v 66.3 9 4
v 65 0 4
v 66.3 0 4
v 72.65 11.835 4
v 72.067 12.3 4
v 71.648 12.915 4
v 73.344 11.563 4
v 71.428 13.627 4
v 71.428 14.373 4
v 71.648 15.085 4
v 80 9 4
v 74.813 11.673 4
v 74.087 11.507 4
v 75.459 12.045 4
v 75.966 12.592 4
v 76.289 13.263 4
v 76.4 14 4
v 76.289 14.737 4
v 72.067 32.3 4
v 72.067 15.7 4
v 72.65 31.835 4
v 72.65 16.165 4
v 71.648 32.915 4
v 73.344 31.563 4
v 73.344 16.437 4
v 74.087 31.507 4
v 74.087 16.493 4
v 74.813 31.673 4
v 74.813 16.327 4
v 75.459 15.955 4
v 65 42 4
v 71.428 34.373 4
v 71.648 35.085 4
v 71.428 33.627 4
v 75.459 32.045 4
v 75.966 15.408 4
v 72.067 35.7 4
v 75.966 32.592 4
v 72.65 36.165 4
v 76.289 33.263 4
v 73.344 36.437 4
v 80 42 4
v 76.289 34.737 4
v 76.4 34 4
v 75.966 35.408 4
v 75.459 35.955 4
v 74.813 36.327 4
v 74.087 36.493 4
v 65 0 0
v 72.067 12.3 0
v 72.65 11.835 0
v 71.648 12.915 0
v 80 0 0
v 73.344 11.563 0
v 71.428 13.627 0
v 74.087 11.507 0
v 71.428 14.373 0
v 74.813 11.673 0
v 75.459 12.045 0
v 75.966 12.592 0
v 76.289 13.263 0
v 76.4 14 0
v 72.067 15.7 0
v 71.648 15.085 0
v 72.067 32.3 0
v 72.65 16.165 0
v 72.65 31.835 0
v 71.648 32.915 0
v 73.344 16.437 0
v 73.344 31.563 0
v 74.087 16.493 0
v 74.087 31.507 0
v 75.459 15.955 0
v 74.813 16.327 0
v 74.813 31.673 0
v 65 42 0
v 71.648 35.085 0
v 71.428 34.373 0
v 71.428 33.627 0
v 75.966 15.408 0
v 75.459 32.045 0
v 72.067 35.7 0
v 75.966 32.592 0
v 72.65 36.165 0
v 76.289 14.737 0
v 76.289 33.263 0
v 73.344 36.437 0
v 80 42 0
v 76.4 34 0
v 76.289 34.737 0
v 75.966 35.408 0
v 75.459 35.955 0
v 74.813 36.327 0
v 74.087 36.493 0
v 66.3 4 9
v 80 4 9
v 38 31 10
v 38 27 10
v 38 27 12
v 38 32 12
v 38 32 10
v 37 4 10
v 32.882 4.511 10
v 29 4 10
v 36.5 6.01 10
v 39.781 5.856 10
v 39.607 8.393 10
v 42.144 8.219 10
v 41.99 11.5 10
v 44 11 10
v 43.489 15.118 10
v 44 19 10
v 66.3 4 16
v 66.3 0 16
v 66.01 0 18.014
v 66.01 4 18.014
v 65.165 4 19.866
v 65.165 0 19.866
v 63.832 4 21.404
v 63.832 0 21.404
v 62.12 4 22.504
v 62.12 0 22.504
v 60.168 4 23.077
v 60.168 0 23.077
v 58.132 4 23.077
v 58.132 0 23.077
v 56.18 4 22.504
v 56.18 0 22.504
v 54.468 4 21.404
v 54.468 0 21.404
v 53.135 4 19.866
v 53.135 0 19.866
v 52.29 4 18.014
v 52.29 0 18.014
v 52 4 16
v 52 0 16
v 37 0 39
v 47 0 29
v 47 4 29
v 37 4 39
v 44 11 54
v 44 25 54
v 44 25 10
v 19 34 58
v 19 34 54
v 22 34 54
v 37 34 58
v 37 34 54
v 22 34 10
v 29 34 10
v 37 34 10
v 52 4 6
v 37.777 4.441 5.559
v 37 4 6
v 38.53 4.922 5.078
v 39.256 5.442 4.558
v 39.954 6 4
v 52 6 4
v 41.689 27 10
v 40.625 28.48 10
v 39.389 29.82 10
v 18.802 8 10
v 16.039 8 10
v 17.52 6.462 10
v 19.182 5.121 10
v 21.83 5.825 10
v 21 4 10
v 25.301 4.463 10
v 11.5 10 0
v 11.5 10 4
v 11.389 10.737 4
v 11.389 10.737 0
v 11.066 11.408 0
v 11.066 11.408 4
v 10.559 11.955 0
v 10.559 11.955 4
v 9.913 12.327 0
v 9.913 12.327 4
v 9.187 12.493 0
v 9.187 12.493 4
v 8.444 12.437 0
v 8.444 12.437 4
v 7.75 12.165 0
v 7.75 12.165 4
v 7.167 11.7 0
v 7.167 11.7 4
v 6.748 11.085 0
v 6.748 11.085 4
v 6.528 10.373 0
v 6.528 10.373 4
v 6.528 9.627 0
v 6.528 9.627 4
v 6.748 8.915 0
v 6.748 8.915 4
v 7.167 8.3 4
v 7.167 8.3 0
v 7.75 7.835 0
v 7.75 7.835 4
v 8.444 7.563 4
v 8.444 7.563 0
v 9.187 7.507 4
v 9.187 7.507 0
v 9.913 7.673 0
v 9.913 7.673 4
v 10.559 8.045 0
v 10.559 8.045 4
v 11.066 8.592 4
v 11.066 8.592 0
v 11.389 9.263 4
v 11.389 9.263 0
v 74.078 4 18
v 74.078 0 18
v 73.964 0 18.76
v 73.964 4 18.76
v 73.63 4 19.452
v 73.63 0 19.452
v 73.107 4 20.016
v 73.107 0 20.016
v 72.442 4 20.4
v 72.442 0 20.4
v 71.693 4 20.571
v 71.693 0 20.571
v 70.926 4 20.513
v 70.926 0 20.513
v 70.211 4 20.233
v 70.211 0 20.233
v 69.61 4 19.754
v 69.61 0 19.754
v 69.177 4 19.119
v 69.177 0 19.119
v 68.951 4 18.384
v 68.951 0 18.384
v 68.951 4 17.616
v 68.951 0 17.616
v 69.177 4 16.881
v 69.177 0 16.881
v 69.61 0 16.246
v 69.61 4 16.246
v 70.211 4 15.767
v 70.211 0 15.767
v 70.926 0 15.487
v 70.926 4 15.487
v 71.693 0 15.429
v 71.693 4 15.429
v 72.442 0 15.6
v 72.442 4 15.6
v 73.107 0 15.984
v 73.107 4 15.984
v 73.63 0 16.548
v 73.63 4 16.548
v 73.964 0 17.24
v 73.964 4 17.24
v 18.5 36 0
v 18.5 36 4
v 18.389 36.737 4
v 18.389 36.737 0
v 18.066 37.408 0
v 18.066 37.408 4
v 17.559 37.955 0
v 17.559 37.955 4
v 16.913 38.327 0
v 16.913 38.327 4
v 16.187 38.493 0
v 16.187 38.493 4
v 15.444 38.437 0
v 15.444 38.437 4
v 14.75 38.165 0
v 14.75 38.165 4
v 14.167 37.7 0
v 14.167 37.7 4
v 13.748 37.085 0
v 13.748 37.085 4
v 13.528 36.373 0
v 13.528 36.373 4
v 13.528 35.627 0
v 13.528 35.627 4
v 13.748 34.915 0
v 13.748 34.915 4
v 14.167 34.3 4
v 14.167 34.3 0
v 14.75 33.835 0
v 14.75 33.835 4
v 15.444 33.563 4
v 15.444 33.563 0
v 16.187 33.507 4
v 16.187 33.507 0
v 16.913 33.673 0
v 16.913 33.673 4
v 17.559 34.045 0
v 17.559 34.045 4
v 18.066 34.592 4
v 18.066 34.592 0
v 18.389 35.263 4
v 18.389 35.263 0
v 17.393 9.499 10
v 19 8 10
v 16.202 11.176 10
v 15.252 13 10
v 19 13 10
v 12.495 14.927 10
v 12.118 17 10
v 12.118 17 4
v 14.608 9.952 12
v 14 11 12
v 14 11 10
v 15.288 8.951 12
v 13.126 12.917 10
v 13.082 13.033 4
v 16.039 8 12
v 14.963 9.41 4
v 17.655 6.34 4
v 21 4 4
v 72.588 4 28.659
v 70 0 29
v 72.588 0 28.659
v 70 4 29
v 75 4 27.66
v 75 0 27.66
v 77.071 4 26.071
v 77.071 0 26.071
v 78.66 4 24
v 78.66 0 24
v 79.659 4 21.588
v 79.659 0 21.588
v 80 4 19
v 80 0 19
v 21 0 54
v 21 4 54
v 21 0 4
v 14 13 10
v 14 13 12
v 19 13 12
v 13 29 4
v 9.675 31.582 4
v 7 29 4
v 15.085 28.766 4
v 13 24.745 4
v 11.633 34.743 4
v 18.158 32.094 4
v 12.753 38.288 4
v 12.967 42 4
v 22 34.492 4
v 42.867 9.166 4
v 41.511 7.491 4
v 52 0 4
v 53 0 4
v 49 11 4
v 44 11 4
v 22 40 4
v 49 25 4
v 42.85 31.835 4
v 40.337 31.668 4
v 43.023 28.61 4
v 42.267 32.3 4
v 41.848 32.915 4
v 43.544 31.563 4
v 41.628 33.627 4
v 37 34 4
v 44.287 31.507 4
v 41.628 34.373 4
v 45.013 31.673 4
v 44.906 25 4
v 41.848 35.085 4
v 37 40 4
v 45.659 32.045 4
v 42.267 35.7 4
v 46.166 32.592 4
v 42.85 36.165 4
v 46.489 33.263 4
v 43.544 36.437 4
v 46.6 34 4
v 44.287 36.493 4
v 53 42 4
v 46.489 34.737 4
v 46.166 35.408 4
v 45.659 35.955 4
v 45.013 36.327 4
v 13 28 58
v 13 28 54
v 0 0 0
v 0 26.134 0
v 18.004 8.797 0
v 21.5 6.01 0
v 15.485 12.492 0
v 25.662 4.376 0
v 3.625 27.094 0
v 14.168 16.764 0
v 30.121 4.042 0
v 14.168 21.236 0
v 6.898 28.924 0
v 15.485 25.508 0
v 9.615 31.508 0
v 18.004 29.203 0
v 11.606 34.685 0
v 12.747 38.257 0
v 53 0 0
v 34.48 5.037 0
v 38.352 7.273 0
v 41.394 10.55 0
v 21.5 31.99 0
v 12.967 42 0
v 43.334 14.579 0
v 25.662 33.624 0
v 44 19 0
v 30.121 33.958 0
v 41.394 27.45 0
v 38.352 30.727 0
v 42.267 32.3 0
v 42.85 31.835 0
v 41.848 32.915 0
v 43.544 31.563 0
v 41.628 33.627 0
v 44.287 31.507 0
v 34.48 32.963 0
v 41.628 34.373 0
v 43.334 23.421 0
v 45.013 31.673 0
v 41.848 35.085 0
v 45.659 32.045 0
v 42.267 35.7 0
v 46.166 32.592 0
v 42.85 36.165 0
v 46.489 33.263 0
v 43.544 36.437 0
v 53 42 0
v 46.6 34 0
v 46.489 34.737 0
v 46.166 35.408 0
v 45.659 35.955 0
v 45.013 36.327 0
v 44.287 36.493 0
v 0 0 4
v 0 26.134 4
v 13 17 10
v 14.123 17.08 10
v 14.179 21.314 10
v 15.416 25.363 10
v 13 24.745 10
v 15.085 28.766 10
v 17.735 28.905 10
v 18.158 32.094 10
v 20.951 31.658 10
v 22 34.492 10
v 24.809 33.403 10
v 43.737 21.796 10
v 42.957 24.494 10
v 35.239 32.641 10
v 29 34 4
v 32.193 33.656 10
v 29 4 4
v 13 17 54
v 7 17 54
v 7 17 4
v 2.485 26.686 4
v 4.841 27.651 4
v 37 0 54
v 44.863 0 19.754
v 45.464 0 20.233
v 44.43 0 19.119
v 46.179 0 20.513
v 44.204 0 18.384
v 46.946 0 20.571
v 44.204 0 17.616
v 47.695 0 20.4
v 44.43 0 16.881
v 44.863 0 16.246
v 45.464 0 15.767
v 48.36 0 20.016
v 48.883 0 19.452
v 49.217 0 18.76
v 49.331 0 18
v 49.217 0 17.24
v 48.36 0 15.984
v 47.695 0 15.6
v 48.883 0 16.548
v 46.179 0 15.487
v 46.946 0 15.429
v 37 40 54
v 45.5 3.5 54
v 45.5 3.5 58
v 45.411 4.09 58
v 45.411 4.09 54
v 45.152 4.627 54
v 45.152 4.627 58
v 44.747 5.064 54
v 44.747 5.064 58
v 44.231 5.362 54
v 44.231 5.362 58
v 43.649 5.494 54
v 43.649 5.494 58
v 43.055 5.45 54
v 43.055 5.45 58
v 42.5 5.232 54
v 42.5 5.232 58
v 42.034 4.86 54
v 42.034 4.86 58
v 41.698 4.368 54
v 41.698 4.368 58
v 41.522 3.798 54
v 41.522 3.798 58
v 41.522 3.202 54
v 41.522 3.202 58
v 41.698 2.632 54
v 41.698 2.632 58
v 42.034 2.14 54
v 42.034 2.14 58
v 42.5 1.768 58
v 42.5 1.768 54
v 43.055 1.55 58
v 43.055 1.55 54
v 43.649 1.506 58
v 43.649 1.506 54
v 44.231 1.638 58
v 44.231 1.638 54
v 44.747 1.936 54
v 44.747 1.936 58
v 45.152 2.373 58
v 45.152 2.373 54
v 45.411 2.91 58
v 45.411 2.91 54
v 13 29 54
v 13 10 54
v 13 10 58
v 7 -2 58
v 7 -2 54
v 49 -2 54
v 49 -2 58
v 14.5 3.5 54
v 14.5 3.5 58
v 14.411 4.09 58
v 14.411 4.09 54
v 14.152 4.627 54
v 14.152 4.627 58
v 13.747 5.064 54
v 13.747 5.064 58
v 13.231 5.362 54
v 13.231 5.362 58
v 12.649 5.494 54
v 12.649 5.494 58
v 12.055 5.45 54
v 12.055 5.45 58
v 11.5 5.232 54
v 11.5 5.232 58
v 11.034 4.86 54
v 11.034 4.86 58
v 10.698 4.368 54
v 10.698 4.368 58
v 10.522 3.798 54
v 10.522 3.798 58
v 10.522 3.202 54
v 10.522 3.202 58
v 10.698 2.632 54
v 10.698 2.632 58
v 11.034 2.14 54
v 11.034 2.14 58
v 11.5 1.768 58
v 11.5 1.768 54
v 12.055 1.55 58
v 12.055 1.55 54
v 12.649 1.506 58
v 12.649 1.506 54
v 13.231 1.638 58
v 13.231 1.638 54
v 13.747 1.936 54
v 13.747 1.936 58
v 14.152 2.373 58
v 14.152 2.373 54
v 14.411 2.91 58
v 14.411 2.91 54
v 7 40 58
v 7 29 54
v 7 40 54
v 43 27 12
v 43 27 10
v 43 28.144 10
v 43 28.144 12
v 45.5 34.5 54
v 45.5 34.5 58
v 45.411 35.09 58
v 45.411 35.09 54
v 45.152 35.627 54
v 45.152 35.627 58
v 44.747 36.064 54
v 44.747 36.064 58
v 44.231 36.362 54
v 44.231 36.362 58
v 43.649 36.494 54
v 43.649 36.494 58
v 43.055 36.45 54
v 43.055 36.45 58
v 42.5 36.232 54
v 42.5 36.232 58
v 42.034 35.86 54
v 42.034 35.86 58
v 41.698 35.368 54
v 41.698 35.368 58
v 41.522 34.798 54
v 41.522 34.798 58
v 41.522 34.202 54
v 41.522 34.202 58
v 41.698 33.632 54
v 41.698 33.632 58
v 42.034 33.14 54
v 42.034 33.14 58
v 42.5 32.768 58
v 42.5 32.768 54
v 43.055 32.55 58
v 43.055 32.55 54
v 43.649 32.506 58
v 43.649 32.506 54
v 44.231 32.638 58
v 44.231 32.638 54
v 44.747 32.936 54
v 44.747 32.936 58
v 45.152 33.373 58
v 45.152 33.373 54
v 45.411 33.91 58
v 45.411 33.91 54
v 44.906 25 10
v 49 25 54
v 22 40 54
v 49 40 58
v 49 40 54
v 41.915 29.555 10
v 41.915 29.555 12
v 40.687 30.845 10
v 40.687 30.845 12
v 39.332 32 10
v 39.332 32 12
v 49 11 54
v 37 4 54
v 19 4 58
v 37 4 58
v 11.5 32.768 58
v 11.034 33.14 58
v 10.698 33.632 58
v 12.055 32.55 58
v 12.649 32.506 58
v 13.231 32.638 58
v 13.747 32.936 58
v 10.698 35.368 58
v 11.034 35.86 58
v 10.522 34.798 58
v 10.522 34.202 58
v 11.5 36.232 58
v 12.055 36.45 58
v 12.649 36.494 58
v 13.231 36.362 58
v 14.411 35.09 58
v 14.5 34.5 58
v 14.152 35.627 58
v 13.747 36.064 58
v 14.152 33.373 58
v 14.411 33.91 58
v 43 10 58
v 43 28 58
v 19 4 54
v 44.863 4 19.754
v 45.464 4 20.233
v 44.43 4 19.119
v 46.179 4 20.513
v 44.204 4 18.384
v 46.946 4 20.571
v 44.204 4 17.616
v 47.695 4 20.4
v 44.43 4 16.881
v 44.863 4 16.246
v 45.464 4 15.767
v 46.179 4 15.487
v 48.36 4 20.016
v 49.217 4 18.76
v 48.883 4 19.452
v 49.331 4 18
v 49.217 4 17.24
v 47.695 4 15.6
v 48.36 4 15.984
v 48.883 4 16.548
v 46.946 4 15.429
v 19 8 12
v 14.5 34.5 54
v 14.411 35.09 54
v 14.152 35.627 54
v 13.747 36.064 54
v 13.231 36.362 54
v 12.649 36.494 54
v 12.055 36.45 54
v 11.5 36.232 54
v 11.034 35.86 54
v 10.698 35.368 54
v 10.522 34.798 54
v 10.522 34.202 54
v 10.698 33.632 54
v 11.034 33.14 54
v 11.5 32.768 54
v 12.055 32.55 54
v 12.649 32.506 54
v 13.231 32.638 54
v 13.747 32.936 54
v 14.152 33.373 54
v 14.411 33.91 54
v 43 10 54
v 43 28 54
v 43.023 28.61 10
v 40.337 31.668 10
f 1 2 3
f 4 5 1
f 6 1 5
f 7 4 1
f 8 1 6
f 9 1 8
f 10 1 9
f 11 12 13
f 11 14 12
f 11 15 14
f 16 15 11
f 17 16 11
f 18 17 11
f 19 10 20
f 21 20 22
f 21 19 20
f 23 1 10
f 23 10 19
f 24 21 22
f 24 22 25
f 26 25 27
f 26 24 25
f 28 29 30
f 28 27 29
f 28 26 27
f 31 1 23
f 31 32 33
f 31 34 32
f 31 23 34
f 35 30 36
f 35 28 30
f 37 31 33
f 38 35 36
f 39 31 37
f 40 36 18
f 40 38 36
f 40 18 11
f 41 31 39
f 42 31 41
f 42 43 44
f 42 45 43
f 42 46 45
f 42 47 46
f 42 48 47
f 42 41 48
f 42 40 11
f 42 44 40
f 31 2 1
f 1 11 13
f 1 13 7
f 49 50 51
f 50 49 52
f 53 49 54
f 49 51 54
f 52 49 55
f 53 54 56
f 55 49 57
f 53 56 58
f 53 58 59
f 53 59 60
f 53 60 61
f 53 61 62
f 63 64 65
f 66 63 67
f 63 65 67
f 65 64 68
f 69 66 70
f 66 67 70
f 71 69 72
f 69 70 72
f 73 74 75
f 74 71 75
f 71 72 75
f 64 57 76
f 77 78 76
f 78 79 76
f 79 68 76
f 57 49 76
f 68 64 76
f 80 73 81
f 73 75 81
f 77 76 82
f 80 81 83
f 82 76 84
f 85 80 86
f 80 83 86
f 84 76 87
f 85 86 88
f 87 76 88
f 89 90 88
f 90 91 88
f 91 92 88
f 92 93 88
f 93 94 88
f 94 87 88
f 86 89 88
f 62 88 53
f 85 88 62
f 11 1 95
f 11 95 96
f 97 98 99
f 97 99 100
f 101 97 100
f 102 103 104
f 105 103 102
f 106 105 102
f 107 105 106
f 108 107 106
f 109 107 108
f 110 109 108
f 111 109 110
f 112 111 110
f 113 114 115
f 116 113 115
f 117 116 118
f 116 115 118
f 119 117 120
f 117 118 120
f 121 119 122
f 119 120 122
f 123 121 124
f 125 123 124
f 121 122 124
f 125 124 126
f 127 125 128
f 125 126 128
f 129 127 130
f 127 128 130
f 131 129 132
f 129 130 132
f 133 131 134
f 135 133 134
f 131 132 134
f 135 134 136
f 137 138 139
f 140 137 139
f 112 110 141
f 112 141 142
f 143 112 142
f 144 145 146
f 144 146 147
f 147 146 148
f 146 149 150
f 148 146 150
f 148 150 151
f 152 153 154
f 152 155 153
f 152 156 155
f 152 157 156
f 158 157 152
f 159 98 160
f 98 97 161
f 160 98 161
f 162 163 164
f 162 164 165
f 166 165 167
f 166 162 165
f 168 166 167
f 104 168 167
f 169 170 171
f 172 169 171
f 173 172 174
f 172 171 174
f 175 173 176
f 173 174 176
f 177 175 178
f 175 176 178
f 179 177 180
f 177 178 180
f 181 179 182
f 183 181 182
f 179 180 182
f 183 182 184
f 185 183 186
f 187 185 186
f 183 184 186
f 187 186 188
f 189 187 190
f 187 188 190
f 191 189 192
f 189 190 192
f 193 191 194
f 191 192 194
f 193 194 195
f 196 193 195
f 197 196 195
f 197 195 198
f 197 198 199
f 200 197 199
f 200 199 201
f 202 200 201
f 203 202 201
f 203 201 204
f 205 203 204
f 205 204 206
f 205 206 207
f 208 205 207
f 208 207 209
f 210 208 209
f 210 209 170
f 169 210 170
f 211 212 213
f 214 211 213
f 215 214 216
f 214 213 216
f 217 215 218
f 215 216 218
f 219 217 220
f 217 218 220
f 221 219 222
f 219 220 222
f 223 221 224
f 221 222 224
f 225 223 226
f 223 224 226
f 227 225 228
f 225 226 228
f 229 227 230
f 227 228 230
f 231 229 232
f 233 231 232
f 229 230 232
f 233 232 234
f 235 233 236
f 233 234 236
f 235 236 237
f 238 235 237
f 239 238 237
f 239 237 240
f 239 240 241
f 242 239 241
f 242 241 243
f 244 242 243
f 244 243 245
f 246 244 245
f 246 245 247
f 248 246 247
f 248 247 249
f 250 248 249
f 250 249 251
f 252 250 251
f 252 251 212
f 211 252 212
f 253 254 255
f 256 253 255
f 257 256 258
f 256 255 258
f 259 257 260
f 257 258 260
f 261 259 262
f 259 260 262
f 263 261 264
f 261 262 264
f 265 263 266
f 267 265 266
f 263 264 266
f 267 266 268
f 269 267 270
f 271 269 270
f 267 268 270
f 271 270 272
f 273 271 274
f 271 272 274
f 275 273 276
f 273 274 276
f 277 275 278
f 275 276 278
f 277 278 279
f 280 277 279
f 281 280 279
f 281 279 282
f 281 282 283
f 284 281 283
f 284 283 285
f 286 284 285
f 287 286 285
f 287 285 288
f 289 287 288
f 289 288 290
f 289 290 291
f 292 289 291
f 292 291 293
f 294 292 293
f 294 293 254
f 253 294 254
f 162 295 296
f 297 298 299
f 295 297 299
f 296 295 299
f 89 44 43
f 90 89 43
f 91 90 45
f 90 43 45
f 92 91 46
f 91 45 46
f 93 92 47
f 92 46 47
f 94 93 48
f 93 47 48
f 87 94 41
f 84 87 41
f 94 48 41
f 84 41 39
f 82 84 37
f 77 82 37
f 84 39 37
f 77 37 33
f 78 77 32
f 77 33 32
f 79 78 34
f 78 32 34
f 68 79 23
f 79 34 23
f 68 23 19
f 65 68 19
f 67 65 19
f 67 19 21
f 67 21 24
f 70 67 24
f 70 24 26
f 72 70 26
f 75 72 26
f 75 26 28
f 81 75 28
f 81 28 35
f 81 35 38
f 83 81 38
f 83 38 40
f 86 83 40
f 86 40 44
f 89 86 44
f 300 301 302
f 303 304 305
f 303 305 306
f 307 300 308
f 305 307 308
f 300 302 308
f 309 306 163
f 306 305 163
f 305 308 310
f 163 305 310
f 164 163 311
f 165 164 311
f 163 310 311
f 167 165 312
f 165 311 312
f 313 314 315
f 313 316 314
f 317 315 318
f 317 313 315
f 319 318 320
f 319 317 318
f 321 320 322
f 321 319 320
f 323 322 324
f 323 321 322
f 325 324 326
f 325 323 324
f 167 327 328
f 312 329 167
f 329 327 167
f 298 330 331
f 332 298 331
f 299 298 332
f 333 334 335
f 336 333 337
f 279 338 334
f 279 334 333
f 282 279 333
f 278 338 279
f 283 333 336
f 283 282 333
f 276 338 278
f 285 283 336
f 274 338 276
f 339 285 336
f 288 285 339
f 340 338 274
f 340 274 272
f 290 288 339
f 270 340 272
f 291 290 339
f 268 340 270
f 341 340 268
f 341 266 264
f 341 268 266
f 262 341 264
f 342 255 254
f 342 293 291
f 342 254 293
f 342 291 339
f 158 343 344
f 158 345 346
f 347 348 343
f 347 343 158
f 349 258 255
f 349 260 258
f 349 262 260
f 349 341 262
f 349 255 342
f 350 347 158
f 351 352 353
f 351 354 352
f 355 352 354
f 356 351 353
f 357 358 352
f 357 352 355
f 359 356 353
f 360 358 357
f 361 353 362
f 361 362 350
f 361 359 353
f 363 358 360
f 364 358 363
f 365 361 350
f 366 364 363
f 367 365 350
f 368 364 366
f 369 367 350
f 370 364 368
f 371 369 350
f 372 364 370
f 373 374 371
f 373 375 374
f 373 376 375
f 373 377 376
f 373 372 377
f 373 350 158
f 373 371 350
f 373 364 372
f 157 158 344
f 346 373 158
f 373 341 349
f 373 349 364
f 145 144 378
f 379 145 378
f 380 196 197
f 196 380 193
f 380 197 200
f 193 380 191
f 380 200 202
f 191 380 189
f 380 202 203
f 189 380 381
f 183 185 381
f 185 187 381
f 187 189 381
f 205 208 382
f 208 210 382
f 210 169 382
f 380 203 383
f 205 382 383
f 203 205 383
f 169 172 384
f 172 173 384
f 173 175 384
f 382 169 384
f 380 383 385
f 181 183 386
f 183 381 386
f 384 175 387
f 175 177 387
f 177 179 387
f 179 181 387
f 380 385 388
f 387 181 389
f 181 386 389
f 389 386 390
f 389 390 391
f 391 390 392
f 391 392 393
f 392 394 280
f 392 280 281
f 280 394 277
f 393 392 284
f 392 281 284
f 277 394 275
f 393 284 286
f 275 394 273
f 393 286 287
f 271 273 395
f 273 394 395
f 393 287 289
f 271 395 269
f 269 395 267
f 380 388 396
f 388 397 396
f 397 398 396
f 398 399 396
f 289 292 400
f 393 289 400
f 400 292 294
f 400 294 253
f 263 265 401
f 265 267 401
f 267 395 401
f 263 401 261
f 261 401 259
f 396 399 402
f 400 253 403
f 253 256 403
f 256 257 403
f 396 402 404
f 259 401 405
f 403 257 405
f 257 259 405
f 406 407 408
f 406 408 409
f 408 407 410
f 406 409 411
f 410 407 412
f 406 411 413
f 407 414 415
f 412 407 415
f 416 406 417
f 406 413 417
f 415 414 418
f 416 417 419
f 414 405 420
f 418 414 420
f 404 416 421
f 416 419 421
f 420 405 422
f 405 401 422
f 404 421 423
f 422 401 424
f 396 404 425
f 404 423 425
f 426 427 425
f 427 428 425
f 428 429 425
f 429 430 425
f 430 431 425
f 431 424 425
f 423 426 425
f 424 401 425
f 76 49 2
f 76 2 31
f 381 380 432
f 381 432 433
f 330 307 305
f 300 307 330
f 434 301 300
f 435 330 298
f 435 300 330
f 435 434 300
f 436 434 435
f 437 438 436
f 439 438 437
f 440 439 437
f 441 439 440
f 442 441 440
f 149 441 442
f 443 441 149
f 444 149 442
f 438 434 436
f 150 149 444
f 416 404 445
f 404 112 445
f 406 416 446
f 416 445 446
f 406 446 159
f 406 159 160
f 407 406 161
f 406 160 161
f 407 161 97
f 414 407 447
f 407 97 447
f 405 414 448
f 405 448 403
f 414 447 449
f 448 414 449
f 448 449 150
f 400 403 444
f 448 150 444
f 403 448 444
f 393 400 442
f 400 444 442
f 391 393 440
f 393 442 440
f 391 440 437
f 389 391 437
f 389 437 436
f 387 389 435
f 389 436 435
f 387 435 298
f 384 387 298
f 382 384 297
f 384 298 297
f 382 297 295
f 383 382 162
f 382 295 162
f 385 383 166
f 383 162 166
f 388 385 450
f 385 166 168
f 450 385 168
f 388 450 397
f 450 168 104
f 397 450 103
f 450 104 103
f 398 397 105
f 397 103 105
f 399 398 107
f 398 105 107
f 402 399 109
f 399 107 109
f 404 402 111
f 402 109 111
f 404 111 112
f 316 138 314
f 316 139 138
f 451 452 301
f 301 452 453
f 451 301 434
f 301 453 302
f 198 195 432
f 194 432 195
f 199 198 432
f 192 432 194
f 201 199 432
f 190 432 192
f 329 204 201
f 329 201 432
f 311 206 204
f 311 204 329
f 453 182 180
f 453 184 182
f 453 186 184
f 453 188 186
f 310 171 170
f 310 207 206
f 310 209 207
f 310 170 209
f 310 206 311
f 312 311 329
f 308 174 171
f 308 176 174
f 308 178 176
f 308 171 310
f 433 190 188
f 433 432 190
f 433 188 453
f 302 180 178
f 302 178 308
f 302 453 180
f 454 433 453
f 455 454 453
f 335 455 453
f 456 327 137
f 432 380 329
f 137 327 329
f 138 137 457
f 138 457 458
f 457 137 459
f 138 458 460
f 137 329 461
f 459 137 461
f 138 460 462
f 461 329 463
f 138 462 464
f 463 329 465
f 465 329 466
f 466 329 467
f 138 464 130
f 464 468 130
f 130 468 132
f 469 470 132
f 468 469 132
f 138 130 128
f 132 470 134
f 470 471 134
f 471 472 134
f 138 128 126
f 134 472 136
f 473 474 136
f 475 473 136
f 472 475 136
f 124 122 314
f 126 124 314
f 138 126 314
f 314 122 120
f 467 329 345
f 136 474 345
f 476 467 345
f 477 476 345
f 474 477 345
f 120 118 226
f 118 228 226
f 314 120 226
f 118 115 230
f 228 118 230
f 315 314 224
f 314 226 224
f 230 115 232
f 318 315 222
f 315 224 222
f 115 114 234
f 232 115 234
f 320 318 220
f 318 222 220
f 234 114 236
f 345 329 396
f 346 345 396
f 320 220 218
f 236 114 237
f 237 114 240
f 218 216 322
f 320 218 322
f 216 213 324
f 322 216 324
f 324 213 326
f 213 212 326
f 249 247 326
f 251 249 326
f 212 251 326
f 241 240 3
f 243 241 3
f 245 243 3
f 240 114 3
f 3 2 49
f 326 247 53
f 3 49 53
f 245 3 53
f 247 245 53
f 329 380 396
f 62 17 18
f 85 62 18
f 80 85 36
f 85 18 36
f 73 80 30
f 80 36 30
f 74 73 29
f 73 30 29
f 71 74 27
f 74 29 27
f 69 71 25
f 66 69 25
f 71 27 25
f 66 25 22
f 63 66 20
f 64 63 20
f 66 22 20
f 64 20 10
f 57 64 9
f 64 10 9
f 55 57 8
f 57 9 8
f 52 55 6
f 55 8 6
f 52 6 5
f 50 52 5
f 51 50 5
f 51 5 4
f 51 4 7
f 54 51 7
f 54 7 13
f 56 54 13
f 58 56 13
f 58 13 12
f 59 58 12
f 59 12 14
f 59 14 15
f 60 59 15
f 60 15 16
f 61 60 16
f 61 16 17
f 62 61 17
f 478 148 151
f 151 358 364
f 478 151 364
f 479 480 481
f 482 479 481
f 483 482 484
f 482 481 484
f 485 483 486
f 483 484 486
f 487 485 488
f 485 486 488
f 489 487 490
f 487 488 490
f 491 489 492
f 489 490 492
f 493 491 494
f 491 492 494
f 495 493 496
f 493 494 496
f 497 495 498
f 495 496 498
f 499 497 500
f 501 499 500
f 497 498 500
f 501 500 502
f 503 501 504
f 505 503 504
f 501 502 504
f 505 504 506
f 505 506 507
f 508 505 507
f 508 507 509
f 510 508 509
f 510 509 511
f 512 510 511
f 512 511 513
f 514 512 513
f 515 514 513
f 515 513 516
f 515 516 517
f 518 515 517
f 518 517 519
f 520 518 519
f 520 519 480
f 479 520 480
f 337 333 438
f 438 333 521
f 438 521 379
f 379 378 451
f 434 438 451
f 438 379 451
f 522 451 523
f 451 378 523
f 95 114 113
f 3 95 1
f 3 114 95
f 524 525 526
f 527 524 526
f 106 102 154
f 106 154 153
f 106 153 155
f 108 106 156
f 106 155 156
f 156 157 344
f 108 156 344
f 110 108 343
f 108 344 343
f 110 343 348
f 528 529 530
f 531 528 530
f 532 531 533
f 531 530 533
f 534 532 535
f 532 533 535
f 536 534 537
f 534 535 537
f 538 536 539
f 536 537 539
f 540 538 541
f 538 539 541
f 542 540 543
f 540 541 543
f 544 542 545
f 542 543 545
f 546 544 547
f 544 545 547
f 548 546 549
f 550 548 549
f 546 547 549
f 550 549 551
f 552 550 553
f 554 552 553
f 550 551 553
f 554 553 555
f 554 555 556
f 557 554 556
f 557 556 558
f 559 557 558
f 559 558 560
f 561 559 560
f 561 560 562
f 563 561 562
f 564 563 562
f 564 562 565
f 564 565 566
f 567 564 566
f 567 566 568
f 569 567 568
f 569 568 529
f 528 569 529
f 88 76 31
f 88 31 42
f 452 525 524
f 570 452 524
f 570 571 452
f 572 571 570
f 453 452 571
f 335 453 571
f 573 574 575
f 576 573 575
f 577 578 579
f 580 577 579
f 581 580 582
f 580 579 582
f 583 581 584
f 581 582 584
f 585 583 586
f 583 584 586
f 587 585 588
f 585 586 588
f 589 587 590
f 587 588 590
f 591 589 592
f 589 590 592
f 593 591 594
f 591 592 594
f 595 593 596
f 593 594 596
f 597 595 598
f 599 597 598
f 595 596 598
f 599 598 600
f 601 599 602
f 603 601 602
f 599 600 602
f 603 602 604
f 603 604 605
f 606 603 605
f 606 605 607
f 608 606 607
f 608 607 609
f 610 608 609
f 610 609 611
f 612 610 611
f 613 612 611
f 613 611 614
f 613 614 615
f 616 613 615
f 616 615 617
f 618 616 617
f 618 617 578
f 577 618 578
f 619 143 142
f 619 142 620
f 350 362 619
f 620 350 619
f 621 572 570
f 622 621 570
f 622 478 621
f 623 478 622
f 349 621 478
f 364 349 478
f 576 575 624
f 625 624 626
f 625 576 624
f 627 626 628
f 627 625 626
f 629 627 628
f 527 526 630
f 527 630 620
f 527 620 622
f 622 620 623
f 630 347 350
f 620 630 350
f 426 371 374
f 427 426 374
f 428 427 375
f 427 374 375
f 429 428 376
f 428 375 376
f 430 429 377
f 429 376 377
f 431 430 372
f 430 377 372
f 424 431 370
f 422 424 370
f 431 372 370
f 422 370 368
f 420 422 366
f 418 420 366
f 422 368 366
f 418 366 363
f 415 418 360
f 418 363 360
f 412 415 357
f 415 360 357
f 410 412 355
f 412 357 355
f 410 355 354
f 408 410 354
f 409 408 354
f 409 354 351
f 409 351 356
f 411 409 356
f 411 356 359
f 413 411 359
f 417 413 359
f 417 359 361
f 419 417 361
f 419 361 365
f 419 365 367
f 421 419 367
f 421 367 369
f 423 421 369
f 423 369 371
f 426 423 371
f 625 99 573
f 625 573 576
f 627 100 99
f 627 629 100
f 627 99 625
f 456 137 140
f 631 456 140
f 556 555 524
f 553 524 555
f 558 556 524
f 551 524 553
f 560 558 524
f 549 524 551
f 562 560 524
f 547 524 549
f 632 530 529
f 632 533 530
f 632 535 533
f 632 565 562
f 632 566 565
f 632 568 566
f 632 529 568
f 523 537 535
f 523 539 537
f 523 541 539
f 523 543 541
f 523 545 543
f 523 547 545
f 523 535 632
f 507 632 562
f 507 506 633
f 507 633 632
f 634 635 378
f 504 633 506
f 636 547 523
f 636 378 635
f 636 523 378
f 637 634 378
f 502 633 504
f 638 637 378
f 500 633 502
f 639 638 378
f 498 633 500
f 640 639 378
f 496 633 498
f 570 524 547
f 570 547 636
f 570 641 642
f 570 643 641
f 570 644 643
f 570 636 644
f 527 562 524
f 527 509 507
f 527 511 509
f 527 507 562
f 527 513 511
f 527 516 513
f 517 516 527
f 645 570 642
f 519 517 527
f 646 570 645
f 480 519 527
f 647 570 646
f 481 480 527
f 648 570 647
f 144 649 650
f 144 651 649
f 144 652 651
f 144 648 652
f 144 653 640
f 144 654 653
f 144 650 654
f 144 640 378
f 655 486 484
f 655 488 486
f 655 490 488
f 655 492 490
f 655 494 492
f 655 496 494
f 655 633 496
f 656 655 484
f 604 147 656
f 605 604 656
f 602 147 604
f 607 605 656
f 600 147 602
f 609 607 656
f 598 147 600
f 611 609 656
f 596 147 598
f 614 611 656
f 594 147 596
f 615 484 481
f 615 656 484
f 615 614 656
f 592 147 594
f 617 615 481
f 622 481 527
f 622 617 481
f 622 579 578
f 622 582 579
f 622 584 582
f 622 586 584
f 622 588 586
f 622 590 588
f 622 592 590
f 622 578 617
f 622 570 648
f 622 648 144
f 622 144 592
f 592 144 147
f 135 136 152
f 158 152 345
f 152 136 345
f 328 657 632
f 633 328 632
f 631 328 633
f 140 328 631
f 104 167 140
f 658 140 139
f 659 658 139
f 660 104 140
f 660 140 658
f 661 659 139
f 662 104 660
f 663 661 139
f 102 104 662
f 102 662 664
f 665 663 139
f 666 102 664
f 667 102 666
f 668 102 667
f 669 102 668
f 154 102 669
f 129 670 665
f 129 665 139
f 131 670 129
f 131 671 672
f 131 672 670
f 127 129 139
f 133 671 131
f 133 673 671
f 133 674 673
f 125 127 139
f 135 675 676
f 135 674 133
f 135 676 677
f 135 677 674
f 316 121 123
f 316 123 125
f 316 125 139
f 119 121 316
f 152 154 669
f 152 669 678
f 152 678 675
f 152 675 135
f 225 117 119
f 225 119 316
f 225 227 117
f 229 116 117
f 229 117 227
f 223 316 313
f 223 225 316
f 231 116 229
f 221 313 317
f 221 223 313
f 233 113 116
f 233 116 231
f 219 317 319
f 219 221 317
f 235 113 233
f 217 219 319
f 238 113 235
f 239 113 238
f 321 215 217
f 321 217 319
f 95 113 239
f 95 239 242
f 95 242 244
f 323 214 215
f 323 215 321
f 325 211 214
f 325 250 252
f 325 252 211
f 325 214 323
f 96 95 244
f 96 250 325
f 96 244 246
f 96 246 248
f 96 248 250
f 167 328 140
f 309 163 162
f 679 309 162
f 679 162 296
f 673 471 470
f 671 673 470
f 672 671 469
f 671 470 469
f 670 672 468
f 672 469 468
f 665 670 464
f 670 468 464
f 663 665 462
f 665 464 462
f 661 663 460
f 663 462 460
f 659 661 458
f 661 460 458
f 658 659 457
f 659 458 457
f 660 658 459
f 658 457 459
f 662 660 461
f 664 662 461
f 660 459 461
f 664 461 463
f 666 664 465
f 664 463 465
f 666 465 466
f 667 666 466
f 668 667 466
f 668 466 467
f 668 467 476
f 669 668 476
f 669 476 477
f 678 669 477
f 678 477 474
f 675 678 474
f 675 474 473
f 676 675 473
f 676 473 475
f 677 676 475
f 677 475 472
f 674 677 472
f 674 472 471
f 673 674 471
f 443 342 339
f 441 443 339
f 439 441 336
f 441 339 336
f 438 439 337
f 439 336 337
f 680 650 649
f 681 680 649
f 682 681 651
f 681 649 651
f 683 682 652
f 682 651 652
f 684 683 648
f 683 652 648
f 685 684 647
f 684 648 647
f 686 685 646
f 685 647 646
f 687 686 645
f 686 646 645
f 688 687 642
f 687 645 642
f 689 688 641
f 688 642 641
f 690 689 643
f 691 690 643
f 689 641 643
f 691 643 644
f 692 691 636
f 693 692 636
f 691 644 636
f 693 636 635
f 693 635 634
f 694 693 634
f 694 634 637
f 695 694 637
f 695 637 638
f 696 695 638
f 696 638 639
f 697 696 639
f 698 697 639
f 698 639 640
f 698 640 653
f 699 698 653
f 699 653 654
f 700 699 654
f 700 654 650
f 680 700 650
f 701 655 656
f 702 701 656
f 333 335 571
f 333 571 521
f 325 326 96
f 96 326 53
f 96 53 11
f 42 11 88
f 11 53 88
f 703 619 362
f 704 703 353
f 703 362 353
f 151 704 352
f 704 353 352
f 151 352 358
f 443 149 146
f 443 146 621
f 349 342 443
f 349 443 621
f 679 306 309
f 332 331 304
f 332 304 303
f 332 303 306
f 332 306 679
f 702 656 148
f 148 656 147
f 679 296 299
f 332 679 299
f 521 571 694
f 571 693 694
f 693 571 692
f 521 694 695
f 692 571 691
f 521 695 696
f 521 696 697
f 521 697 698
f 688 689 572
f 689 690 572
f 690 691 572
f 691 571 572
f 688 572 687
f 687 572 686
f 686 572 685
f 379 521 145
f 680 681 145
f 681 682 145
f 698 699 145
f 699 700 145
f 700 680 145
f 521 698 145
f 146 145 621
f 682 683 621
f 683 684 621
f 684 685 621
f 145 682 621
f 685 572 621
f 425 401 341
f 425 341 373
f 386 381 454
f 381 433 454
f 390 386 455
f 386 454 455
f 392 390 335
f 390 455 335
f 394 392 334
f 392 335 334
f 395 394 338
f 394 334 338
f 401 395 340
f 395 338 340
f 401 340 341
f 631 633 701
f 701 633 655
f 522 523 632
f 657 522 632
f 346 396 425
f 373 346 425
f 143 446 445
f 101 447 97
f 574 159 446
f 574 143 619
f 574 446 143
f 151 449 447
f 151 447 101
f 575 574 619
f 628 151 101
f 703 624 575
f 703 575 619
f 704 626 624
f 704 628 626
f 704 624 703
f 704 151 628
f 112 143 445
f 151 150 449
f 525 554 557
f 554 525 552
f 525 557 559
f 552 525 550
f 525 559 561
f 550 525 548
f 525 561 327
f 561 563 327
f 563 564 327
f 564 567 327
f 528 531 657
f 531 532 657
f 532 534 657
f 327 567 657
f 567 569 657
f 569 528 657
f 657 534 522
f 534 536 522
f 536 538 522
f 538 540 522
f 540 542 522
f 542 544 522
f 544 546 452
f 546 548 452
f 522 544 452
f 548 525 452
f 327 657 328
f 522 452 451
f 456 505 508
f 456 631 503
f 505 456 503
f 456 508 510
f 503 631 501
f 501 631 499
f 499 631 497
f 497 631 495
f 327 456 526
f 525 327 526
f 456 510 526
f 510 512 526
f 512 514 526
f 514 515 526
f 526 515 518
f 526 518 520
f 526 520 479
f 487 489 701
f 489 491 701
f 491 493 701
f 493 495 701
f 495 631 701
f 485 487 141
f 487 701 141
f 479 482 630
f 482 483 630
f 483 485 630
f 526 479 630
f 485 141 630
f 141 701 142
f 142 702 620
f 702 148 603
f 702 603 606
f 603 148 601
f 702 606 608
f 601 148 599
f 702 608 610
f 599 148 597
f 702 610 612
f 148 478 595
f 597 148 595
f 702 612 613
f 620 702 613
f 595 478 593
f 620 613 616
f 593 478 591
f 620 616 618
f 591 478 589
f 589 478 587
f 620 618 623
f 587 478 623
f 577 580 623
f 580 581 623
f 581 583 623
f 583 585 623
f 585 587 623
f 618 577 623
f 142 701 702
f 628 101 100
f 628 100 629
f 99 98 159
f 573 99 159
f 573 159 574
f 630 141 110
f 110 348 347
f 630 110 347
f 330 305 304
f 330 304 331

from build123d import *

# Parameters (mm, degrees)
BOX009_W        = 12
BOX009_H        = 50
BOX009_DEPTH    = 10
BOX008_W        = 43
BOX008_H        = 4
BOX008_DEPTH    = 25
SKETCH006_R     = 2.5781
POCKET005_DEPTH = 4.001
FILLET_R        = 10
BOX007_W        = 5
BOX007_H        = 5
BOX007_DEPTH    = 2
SKETCH004_R     = 22
SKETCH004_R_2   = 17
POCKET003_DEPTH = 4
BOX001_W        = 15
BOX001_H        = 6
BOX001_DEPTH    = 50
BOX002_W        = 16
BOX002_H        = 4
BOX002_DEPTH    = 50
BOX004_W        = 6
BOX004_H        = 12
BOX004_DEPTH    = 50
BOX003_W        = 5
BOX003_H        = 14
BOX003_DEPTH    = 50
BOX_W           = 80
BOX_H           = 42
BOX_DEPTH       = 4
SKETCH_R        = 15
SKETCH_R_2      = 2.5
POCKET_DEPTH    = 4.001
SKETCH001_R     = 17
PAD_DEPTH       = 6
SKETCH002_R     = 15
POCKET001_DEPTH = 10.001
BOX005_W        = 42
BOX005_H        = 42
BOX005_DEPTH    = 4
SKETCH003_R     = 2
POCKET002_DEPTH = 4.001
BOX006_W        = 5
BOX006_H        = 5
BOX006_DEPTH    = 2
SKETCH005_R     = 22
SKETCH005_R_2   = 17
POCKET004_DEPTH = 4
CHAMFER_SIZE    = 5
CHAMFER001_SIZE = 2
CHAMFER002_SIZE = 10


with BuildPart() as cube008:
    # Box009 → Box009 (new body)
    with BuildSketch(Plane(origin=(53, -4, 0), x_dir=(1, 0, 0), z_dir=(0, 0, 1))):
        with Locations((6, 25)):
            Rectangle(BOX009_W, BOX009_H)
    extrude(amount=BOX009_DEPTH)


with BuildPart() as fillet_body:
    # Box008 → Box008 (new body)
    with BuildSketch(Plane(origin=(37, 0, 4), x_dir=(1, 0, 0), z_dir=(0, 0, 1))):
        with Locations((21.5, 2)):
            Rectangle(BOX008_W, BOX008_H)
    extrude(amount=BOX008_DEPTH)

    # Sketch006 → Pocket005 (cut, through all)
    with BuildSketch(Plane(origin=(37, 0, 4), x_dir=(1, 0, 0), z_dir=(0, -1, 0))):
        with Locations((34.5, 14)):
            Circle(SKETCH006_R)
        with Locations((9.753, 14)):
            Circle(SKETCH006_R)
        with BuildLine():
            ThreePointArc((29.3, 12.000026), (22.149987, 19.15), (15, 12))
            Line((15, 12), (15, 0))
            Line((15, 0), (29.3, 0))
            Line((29.3, 12.000026), (29.3, 0))
        make_face()
    extrude(amount=-POCKET005_DEPTH, mode=Mode.SUBTRACT)

    # Fillet
    fillet_edges = [fillet_body.edges().sort_by_distance(p)[0] for p in [
        (80, 2, 29),
    ]]
    fillet(fillet_edges, radius=FILLET_R)


with BuildPart() as pocket003:
    # Box007 → Box007 (new body)
    with BuildSketch(Plane(origin=(38, 27, 10), x_dir=(1, 0, 0), z_dir=(0, 0, 1))):
        with Locations((2.5, 2.5)):
            Rectangle(BOX007_W, BOX007_H)
    extrude(amount=BOX007_DEPTH)

    # Sketch004 → Pocket003 (cut)
    with BuildSketch(Plane(origin=(38, 27, 12), x_dir=(1, 0, 0), z_dir=(0, 0, 1))):
        with Locations((-9, -8.5)):
            Circle(SKETCH004_R)
        with Locations((-9, -8.5)):
            Circle(SKETCH004_R_2, mode=Mode.SUBTRACT)
    extrude(amount=-POCKET003_DEPTH, mode=Mode.SUBTRACT)


with BuildPart() as cube:
    # Box001 → Box001 (new body)
    with BuildSketch(Plane(origin=(22, 34, 4), x_dir=(1, 0, 0), z_dir=(0, 0, 1))):
        with Locations((7.5, 3)):
            Rectangle(BOX001_W, BOX001_H)
    extrude(amount=BOX001_DEPTH)


with BuildPart() as cube001:
    # Box002 → Box002 (new body)
    with BuildSketch(Plane(origin=(21, 0, 4), x_dir=(1, 0, 0), z_dir=(0, 0, 1))):
        with Locations((8, 2)):
            Rectangle(BOX002_W, BOX002_H)
    extrude(amount=BOX002_DEPTH)


with BuildPart() as cube003:
    # Box004 → Box004 (new body)
    with BuildSketch(Plane(origin=(7, 17, 4), x_dir=(1, 0, 0), z_dir=(0, 0, 1))):
        with Locations((3, 6)):
            Rectangle(BOX004_W, BOX004_H)
    extrude(amount=BOX004_DEPTH)


with BuildPart() as cube002:
    # Box003 → Box003 (new body)
    with BuildSketch(Plane(origin=(44, 11, 4), x_dir=(1, 0, 0), z_dir=(0, 0, 1))):
        with Locations((2.5, 7)):
            Rectangle(BOX003_W, BOX003_H)
    extrude(amount=BOX003_DEPTH)


with BuildPart() as fusion:
    # Box → Box (new body)
    with BuildSketch(Plane.XY):
        with Locations((40, 21)):
            Rectangle(BOX_W, BOX_H)
    extrude(amount=BOX_DEPTH)

    # Sketch → Pocket (cut, through all)
    with BuildSketch(Plane.XY.offset(4)):
        with Locations((-2, 41)):
            Circle(SKETCH_R)
        with Locations((29, 19)):
            Circle(SKETCH_R)
        with Locations((9, 10)):
            Circle(SKETCH_R_2)
        with Locations((16, 36)):
            Circle(SKETCH_R_2)
        with Locations((44.1, 34)):
            Circle(SKETCH_R_2)
        with Locations((73.9, 34)):
            Circle(SKETCH_R_2)
        with Locations((73.9, 14)):
            Circle(SKETCH_R_2)
    extrude(amount=-POCKET_DEPTH, mode=Mode.SUBTRACT)

    # Sketch001 → Pad (new body)
    with BuildSketch(Plane.XY.offset(4)):
        with Locations((29, 19)):
            Circle(SKETCH001_R)
    extrude(amount=PAD_DEPTH)

    # Sketch002 → Pocket001 (cut, through all)
    with BuildSketch(Plane.XY.offset(10)):
        with Locations((29, 19)):
            Circle(SKETCH002_R)
    extrude(amount=-POCKET001_DEPTH, mode=Mode.SUBTRACT)

    # Fusion: union Cube, Cube001, Cube003, Cube002
    add(cube.part)
    add(cube001.part)
    add(cube003.part)
    add(cube002.part)


with BuildPart() as fusion001:
    # Box005 → Box005 (new body)
    with BuildSketch(Plane(origin=(7, -2, 54), x_dir=(1, 0, 0), z_dir=(0, 0, 1))):
        with Locations((21, 21)):
            Rectangle(BOX005_W, BOX005_H)
    extrude(amount=BOX005_DEPTH)

    # Sketch003 → Pocket002 (cut, through all)
    with BuildSketch(Plane(origin=(7, -2, 58), x_dir=(1, 0, 0), z_dir=(0, 0, 1))):
        with Locations((5.5, 36.5)):
            Circle(SKETCH003_R)
        with Locations((36.5, 36.5)):
            Circle(SKETCH003_R)
        with Locations((5.5, 5.5)):
            Circle(SKETCH003_R)
        with Locations((36.5, 5.5)):
            Circle(SKETCH003_R)
        Polygon((6, 30), (6, 12), (12, 6), (30, 6), (36, 12), (36, 30), (30, 36), (12, 36), align=None)
    extrude(amount=-POCKET002_DEPTH, mode=Mode.SUBTRACT)

    # Fusion001: union Fusion
    add(fusion.part)


with BuildPart() as chamfer002:
    # Box006 → Box006 (new body)
    with BuildSketch(Plane(origin=(14, 8, 10), x_dir=(1, 0, 0), z_dir=(0, 0, 1))):
        with Locations((2.5, 2.5)):
            Rectangle(BOX006_W, BOX006_H)
    extrude(amount=BOX006_DEPTH)

    # Sketch005 → Pocket004 (cut)
    with BuildSketch(Plane(origin=(14, 8, 12), x_dir=(1, 0, 0), z_dir=(0, 0, 1))):
        with Locations((15, 11)):
            Circle(SKETCH005_R)
        with Locations((15, 11)):
            Circle(SKETCH005_R_2, mode=Mode.SUBTRACT)
    extrude(amount=-POCKET004_DEPTH, mode=Mode.SUBTRACT)

    # Fusion002: union Pocket003, Fusion001
    add(pocket003.part)
    add(fusion001.part)

    # Fusion003: union Fillet body
    add(fillet_body.part)

    # Chamfer
    chamfer_edges = [chamfer002.edges().sort_by_distance(p)[0] for p in [
        (73.15, 4, 4),
    ]]
    chamfer(chamfer_edges, length=CHAMFER_SIZE)

    # Chamfer001
    chamfer001_edges = [chamfer002.edges().sort_by_distance(p)[0] for p in [
        (44.5, 4, 4),
    ]]
    chamfer(chamfer001_edges, length=CHAMFER001_SIZE)

    # Cut: cut Cube008
    add(cube008.part, mode=Mode.SUBTRACT)

    # Chamfer002
    chamfer002_edges = [chamfer002.edges().sort_by_distance(p)[0] for p in [
        (37, 2, 29),
    ]]
    chamfer(chamfer002_edges, length=CHAMFER002_SIZE)


solid = chamfer002.part
